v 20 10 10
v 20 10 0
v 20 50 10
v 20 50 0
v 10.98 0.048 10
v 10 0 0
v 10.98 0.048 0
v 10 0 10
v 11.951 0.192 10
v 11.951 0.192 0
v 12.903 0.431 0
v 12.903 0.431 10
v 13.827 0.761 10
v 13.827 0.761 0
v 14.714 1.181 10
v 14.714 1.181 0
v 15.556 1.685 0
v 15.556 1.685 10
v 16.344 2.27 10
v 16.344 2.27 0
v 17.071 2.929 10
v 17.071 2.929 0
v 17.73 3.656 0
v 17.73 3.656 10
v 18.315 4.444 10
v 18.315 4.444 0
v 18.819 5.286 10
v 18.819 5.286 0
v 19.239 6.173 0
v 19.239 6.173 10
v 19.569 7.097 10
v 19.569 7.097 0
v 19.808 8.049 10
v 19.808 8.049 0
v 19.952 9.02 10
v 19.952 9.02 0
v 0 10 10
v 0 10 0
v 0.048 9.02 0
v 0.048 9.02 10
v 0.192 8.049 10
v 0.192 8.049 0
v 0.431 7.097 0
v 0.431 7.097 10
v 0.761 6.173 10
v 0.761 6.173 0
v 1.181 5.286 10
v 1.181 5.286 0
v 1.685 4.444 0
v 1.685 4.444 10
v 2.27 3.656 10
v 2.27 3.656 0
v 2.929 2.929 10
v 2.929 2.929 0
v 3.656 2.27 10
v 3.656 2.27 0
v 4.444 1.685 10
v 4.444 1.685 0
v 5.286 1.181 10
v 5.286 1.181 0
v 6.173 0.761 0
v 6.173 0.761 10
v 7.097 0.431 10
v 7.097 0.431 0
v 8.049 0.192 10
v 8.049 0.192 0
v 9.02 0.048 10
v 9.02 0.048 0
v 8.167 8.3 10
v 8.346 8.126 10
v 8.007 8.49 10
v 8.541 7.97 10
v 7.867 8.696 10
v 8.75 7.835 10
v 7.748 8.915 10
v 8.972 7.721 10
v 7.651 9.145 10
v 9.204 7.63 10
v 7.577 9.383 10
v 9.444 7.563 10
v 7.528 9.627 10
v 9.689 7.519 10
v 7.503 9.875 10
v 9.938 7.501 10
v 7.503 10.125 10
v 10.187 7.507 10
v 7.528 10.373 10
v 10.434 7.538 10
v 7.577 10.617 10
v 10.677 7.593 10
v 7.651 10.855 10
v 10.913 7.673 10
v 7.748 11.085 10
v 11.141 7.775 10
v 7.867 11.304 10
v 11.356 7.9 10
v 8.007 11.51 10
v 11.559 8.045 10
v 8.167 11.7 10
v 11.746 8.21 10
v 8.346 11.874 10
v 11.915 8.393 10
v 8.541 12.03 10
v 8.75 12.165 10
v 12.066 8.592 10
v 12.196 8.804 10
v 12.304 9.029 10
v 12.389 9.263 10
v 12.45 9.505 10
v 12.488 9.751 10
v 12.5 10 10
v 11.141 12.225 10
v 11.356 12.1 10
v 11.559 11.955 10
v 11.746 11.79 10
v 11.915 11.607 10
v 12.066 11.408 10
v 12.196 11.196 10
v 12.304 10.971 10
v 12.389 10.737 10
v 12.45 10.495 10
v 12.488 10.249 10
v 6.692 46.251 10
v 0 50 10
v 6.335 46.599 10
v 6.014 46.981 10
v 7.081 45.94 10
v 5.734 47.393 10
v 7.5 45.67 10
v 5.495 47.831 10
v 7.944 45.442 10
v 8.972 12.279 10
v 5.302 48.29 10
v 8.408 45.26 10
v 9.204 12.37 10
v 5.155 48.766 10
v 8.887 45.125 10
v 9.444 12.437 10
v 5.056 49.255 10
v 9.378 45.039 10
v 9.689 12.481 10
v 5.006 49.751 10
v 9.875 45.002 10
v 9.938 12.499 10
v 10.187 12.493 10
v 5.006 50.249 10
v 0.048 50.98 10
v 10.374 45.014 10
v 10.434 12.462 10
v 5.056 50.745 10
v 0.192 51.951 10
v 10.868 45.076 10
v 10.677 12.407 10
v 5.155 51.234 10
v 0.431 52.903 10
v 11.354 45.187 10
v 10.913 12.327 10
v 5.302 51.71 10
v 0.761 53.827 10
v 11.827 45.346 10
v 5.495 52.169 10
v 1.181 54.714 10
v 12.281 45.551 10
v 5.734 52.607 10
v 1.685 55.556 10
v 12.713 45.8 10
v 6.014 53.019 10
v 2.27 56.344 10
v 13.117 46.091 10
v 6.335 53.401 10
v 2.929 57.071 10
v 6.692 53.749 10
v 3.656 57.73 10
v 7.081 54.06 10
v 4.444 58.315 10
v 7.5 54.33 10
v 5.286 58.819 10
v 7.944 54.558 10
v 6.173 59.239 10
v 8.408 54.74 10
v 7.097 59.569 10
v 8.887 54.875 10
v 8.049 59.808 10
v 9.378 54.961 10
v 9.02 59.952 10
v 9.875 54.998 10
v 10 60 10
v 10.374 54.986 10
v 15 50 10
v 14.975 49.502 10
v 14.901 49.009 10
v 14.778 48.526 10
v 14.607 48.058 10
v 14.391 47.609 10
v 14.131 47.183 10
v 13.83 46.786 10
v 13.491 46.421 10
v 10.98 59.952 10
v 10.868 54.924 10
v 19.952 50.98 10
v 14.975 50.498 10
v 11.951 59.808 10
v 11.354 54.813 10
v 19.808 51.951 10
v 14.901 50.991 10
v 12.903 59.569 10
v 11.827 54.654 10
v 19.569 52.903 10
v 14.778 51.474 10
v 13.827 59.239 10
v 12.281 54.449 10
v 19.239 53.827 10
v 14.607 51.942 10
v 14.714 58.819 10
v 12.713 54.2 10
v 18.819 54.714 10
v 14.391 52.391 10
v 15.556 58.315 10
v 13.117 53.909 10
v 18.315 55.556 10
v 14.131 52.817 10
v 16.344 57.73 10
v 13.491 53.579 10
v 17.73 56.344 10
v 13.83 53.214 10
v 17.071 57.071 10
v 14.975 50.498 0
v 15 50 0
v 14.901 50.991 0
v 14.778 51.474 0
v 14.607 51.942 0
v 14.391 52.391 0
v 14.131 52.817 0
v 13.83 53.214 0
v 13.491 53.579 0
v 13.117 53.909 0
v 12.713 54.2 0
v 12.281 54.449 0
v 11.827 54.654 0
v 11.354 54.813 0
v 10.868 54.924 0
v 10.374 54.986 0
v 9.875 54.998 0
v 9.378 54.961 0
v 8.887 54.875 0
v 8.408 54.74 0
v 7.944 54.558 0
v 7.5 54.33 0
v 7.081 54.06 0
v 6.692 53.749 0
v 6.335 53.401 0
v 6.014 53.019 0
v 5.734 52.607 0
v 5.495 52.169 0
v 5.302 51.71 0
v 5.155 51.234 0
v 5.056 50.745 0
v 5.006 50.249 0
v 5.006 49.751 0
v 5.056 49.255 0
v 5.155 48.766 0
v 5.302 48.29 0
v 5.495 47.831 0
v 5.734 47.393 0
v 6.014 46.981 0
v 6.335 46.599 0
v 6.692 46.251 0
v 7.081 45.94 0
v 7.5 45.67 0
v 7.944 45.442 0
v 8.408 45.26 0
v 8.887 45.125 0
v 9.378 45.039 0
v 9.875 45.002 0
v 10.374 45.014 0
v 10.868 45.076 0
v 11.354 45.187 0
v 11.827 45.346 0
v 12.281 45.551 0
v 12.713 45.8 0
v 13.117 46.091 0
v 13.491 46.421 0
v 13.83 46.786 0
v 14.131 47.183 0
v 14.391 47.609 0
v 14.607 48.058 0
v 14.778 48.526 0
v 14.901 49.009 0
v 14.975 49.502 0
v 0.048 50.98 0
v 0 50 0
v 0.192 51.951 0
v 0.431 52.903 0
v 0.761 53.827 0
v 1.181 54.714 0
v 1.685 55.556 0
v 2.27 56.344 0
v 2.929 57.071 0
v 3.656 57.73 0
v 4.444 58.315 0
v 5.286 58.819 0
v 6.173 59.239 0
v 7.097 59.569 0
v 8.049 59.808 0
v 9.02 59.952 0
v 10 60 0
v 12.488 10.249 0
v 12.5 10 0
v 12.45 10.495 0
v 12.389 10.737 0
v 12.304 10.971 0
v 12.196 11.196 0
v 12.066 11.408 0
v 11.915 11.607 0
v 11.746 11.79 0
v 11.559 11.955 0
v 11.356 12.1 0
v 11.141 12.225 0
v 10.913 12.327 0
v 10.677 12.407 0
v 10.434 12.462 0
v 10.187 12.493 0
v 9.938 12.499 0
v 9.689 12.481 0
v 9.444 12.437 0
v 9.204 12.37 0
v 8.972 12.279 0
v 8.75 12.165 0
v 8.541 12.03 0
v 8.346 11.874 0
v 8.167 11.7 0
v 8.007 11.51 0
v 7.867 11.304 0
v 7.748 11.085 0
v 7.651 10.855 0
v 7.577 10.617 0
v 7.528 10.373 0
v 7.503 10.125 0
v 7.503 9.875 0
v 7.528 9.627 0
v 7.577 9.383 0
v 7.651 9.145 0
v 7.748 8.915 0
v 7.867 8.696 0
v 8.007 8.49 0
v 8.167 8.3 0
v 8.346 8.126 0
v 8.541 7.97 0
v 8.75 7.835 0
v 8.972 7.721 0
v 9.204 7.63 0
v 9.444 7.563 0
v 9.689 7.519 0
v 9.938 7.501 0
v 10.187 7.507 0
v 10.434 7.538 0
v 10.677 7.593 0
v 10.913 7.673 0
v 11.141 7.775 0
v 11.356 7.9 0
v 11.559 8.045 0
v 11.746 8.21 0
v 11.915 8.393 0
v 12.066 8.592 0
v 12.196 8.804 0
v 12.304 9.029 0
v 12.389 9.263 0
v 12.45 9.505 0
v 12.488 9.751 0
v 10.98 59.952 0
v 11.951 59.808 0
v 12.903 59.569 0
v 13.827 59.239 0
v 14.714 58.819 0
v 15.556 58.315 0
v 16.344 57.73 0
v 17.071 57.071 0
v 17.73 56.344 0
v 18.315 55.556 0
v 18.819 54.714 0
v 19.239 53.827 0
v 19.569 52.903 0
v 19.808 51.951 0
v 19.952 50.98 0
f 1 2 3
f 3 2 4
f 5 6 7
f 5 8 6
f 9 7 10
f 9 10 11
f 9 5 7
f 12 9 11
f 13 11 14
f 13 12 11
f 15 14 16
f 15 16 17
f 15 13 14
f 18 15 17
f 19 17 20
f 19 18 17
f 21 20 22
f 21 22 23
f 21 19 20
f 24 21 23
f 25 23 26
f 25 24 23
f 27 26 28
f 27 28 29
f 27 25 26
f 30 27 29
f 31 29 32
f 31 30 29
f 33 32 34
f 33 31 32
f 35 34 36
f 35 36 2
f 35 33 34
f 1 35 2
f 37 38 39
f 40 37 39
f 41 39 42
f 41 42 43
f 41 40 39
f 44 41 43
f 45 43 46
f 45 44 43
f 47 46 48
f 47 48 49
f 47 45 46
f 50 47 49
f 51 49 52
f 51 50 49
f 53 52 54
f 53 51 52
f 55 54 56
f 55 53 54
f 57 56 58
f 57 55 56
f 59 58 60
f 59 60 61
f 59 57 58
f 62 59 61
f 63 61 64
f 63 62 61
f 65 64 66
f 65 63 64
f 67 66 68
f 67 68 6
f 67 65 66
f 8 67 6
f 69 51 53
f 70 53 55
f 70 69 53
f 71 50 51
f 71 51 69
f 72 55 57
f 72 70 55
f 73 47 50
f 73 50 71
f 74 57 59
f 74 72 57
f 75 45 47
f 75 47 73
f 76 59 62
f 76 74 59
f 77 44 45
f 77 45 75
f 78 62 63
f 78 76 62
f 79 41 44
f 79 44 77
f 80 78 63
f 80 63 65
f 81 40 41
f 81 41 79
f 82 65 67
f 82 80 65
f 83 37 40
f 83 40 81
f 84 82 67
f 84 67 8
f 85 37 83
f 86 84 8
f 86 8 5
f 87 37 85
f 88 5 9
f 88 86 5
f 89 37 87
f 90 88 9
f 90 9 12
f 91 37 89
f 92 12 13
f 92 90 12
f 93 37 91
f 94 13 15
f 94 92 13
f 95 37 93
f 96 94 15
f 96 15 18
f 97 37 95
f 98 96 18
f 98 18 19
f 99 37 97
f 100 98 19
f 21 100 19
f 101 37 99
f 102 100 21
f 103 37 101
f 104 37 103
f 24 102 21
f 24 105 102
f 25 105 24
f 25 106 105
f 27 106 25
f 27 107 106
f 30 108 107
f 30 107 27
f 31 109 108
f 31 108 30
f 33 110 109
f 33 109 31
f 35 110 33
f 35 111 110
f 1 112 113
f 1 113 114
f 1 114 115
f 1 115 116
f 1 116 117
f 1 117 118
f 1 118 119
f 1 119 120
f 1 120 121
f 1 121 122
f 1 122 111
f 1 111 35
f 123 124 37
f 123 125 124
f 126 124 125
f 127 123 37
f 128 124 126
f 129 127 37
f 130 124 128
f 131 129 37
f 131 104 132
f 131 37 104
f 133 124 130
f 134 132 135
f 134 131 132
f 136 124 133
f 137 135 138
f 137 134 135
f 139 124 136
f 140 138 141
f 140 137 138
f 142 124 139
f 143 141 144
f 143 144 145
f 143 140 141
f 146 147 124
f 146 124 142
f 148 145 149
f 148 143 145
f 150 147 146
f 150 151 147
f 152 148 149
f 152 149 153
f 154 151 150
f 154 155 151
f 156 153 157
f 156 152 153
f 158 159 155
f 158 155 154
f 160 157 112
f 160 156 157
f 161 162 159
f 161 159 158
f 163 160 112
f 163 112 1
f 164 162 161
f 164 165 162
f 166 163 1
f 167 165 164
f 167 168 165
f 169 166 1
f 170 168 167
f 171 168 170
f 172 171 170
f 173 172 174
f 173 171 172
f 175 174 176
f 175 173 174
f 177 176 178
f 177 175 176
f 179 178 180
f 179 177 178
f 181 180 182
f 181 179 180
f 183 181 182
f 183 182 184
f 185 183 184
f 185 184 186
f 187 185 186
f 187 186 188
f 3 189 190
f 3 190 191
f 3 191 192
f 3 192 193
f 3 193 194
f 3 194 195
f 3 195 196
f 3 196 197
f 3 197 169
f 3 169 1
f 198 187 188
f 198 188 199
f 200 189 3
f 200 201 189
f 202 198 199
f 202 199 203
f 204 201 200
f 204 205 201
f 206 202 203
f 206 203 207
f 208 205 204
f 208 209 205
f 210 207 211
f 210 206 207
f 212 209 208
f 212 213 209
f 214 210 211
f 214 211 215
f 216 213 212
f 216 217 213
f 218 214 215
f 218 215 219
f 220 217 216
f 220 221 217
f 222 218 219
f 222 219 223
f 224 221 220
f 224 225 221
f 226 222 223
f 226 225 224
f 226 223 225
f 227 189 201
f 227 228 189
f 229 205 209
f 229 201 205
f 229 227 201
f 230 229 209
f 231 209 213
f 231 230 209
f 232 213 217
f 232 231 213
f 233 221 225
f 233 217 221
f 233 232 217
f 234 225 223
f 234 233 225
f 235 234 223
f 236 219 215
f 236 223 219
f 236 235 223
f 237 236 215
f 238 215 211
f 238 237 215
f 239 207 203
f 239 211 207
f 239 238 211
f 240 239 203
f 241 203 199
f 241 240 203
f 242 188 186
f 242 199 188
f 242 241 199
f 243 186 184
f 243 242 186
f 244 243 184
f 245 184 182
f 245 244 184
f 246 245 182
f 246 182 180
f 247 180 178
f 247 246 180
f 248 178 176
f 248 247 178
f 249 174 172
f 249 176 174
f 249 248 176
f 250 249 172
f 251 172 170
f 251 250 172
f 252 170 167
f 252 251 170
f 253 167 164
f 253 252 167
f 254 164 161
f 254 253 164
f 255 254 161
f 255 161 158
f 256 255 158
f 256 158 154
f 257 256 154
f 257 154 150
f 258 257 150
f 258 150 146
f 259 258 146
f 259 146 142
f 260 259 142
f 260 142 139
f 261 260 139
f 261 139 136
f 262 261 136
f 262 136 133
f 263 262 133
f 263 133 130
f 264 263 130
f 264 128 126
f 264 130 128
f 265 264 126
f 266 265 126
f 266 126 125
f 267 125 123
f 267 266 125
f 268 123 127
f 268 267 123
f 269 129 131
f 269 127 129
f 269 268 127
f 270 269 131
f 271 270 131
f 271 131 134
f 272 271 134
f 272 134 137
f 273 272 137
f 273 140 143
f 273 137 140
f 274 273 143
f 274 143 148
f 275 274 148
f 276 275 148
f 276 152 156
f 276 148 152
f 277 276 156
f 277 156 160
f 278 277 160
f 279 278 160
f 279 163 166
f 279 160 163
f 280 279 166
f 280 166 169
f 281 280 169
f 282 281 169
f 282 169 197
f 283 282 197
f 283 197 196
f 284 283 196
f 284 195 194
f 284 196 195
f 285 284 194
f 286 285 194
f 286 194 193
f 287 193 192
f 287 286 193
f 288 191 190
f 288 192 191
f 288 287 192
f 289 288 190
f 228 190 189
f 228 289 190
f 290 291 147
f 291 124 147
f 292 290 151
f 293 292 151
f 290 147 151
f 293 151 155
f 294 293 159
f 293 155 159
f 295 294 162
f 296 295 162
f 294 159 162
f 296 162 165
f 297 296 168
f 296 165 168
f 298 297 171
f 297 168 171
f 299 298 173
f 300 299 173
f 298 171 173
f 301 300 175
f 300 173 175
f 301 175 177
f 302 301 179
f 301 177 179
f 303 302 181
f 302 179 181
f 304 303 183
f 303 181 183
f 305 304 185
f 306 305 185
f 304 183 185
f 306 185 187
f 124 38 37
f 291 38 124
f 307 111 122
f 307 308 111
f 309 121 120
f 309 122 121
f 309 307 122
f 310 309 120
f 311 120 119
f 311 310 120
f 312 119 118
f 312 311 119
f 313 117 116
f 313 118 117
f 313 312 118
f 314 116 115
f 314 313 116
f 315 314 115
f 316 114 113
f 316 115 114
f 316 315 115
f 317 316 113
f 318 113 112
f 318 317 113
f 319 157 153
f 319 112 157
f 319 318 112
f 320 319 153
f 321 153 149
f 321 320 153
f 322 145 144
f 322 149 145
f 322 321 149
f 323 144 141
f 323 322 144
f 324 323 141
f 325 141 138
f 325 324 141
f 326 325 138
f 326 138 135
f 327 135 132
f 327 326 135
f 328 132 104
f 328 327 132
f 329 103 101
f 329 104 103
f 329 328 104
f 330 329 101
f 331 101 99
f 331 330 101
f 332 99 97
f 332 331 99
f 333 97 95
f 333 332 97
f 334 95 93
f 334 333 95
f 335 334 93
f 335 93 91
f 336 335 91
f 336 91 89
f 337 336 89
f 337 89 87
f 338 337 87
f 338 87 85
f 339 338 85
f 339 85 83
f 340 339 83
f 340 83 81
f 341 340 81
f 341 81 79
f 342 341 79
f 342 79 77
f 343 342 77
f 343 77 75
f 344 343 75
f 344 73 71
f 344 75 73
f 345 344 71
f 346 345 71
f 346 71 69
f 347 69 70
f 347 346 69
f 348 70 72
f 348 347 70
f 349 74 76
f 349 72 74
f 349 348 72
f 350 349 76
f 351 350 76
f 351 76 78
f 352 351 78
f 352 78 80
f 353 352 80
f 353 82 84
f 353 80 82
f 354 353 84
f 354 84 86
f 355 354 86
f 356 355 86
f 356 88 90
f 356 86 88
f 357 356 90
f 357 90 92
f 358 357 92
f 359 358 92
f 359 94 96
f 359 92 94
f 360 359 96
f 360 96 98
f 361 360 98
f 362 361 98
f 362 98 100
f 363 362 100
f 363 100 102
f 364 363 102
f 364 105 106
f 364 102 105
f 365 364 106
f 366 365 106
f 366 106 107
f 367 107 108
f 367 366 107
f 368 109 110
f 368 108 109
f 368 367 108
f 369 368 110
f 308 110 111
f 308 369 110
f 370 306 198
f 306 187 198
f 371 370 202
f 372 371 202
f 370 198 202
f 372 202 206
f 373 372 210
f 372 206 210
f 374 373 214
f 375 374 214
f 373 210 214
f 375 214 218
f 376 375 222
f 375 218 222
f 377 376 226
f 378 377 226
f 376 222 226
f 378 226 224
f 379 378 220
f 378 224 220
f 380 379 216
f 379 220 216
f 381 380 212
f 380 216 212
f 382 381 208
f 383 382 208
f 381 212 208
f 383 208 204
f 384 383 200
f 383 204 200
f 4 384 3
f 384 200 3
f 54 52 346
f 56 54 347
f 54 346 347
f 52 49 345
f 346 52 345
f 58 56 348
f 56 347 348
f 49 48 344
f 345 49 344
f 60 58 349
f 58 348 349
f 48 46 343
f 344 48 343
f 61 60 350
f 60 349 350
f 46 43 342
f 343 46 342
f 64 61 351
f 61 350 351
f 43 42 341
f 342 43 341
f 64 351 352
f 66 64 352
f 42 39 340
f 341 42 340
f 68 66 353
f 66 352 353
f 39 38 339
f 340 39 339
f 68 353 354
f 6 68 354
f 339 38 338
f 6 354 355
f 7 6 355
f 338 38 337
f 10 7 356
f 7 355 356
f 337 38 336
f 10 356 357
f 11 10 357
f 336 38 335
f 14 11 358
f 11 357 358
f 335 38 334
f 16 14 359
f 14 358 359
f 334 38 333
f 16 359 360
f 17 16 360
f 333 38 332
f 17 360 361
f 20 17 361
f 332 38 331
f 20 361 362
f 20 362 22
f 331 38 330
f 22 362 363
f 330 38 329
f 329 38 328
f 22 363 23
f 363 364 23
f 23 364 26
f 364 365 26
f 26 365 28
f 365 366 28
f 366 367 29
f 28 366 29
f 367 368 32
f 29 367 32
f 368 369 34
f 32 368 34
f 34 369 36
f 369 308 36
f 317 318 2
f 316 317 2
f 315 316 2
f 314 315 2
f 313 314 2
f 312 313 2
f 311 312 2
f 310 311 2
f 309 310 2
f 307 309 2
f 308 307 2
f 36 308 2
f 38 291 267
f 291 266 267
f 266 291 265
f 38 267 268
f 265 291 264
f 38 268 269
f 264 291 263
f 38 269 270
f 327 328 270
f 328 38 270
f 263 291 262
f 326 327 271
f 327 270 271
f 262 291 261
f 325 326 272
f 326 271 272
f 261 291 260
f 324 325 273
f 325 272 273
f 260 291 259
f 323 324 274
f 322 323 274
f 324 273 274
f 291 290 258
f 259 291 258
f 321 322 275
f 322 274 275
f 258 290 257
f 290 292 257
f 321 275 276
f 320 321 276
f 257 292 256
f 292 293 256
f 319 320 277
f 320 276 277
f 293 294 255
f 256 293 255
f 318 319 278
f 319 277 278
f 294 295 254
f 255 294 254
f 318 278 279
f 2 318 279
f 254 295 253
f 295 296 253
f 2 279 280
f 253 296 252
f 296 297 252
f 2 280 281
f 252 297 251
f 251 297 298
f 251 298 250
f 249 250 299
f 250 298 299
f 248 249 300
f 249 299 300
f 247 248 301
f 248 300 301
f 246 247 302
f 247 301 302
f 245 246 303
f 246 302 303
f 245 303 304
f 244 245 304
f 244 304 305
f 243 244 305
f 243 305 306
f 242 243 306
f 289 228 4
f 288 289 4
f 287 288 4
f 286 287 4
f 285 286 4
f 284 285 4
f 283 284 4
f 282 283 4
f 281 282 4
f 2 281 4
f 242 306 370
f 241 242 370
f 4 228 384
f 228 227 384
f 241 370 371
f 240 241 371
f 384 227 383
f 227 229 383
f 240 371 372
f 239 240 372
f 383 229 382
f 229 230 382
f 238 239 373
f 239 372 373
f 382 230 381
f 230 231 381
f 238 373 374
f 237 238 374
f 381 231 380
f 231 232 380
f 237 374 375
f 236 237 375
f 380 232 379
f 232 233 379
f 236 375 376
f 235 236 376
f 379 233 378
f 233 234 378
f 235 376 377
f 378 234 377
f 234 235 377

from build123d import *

# Parameters (mm, degrees)
ESQUISSE1_W                  = 20
ESQUISSE1_H                  = 60
BOSS_EXTRU_1_DEPTH           = 10
ENL_V_MAT_EXTRU_1_DEPTH      = 65.031242374
ENL_V_MAT_EXTRU_1_DEPTH_BACK = 65.031242374
ESQUISSE2_R                  = 5
ESQUISSE2_R_2                = 2.5
CONG_1_R                     = 10


with BuildPart() as part:
    # Esquisse1 → Boss.-Extru.1 (new body)
    with BuildSketch(Plane.XY):
        with Locations((10, 30)):
            Rectangle(ESQUISSE1_W, ESQUISSE1_H)
    extrude(amount=BOSS_EXTRU_1_DEPTH)

    # Esquisse2 → Enlèv. mat.-Extru.1 (cut, two sides: drawn at the far end of the back side and taken through both)
    with BuildSketch(Plane.XY.offset(10).offset(-ENL_V_MAT_EXTRU_1_DEPTH_BACK)):
        with Locations((10, 50)):
            Circle(ESQUISSE2_R)
        with Locations((10, 10)):
            Circle(ESQUISSE2_R_2)
    extrude(amount=ENL_V_MAT_EXTRU_1_DEPTH + ENL_V_MAT_EXTRU_1_DEPTH_BACK, mode=Mode.SUBTRACT)

    # Congé1
    cong_1_edges = [part.edges().sort_by_distance(p)[0] for p in [
        (0, 0, 5),
        (20, 0, 5),
        (0, 60, 5),
        (20, 60, 5),
    ]]
    fillet(cong_1_edges, radius=CONG_1_R - 0.0001)  # a hair under: the kernel refuses the full size


solid = part.part
